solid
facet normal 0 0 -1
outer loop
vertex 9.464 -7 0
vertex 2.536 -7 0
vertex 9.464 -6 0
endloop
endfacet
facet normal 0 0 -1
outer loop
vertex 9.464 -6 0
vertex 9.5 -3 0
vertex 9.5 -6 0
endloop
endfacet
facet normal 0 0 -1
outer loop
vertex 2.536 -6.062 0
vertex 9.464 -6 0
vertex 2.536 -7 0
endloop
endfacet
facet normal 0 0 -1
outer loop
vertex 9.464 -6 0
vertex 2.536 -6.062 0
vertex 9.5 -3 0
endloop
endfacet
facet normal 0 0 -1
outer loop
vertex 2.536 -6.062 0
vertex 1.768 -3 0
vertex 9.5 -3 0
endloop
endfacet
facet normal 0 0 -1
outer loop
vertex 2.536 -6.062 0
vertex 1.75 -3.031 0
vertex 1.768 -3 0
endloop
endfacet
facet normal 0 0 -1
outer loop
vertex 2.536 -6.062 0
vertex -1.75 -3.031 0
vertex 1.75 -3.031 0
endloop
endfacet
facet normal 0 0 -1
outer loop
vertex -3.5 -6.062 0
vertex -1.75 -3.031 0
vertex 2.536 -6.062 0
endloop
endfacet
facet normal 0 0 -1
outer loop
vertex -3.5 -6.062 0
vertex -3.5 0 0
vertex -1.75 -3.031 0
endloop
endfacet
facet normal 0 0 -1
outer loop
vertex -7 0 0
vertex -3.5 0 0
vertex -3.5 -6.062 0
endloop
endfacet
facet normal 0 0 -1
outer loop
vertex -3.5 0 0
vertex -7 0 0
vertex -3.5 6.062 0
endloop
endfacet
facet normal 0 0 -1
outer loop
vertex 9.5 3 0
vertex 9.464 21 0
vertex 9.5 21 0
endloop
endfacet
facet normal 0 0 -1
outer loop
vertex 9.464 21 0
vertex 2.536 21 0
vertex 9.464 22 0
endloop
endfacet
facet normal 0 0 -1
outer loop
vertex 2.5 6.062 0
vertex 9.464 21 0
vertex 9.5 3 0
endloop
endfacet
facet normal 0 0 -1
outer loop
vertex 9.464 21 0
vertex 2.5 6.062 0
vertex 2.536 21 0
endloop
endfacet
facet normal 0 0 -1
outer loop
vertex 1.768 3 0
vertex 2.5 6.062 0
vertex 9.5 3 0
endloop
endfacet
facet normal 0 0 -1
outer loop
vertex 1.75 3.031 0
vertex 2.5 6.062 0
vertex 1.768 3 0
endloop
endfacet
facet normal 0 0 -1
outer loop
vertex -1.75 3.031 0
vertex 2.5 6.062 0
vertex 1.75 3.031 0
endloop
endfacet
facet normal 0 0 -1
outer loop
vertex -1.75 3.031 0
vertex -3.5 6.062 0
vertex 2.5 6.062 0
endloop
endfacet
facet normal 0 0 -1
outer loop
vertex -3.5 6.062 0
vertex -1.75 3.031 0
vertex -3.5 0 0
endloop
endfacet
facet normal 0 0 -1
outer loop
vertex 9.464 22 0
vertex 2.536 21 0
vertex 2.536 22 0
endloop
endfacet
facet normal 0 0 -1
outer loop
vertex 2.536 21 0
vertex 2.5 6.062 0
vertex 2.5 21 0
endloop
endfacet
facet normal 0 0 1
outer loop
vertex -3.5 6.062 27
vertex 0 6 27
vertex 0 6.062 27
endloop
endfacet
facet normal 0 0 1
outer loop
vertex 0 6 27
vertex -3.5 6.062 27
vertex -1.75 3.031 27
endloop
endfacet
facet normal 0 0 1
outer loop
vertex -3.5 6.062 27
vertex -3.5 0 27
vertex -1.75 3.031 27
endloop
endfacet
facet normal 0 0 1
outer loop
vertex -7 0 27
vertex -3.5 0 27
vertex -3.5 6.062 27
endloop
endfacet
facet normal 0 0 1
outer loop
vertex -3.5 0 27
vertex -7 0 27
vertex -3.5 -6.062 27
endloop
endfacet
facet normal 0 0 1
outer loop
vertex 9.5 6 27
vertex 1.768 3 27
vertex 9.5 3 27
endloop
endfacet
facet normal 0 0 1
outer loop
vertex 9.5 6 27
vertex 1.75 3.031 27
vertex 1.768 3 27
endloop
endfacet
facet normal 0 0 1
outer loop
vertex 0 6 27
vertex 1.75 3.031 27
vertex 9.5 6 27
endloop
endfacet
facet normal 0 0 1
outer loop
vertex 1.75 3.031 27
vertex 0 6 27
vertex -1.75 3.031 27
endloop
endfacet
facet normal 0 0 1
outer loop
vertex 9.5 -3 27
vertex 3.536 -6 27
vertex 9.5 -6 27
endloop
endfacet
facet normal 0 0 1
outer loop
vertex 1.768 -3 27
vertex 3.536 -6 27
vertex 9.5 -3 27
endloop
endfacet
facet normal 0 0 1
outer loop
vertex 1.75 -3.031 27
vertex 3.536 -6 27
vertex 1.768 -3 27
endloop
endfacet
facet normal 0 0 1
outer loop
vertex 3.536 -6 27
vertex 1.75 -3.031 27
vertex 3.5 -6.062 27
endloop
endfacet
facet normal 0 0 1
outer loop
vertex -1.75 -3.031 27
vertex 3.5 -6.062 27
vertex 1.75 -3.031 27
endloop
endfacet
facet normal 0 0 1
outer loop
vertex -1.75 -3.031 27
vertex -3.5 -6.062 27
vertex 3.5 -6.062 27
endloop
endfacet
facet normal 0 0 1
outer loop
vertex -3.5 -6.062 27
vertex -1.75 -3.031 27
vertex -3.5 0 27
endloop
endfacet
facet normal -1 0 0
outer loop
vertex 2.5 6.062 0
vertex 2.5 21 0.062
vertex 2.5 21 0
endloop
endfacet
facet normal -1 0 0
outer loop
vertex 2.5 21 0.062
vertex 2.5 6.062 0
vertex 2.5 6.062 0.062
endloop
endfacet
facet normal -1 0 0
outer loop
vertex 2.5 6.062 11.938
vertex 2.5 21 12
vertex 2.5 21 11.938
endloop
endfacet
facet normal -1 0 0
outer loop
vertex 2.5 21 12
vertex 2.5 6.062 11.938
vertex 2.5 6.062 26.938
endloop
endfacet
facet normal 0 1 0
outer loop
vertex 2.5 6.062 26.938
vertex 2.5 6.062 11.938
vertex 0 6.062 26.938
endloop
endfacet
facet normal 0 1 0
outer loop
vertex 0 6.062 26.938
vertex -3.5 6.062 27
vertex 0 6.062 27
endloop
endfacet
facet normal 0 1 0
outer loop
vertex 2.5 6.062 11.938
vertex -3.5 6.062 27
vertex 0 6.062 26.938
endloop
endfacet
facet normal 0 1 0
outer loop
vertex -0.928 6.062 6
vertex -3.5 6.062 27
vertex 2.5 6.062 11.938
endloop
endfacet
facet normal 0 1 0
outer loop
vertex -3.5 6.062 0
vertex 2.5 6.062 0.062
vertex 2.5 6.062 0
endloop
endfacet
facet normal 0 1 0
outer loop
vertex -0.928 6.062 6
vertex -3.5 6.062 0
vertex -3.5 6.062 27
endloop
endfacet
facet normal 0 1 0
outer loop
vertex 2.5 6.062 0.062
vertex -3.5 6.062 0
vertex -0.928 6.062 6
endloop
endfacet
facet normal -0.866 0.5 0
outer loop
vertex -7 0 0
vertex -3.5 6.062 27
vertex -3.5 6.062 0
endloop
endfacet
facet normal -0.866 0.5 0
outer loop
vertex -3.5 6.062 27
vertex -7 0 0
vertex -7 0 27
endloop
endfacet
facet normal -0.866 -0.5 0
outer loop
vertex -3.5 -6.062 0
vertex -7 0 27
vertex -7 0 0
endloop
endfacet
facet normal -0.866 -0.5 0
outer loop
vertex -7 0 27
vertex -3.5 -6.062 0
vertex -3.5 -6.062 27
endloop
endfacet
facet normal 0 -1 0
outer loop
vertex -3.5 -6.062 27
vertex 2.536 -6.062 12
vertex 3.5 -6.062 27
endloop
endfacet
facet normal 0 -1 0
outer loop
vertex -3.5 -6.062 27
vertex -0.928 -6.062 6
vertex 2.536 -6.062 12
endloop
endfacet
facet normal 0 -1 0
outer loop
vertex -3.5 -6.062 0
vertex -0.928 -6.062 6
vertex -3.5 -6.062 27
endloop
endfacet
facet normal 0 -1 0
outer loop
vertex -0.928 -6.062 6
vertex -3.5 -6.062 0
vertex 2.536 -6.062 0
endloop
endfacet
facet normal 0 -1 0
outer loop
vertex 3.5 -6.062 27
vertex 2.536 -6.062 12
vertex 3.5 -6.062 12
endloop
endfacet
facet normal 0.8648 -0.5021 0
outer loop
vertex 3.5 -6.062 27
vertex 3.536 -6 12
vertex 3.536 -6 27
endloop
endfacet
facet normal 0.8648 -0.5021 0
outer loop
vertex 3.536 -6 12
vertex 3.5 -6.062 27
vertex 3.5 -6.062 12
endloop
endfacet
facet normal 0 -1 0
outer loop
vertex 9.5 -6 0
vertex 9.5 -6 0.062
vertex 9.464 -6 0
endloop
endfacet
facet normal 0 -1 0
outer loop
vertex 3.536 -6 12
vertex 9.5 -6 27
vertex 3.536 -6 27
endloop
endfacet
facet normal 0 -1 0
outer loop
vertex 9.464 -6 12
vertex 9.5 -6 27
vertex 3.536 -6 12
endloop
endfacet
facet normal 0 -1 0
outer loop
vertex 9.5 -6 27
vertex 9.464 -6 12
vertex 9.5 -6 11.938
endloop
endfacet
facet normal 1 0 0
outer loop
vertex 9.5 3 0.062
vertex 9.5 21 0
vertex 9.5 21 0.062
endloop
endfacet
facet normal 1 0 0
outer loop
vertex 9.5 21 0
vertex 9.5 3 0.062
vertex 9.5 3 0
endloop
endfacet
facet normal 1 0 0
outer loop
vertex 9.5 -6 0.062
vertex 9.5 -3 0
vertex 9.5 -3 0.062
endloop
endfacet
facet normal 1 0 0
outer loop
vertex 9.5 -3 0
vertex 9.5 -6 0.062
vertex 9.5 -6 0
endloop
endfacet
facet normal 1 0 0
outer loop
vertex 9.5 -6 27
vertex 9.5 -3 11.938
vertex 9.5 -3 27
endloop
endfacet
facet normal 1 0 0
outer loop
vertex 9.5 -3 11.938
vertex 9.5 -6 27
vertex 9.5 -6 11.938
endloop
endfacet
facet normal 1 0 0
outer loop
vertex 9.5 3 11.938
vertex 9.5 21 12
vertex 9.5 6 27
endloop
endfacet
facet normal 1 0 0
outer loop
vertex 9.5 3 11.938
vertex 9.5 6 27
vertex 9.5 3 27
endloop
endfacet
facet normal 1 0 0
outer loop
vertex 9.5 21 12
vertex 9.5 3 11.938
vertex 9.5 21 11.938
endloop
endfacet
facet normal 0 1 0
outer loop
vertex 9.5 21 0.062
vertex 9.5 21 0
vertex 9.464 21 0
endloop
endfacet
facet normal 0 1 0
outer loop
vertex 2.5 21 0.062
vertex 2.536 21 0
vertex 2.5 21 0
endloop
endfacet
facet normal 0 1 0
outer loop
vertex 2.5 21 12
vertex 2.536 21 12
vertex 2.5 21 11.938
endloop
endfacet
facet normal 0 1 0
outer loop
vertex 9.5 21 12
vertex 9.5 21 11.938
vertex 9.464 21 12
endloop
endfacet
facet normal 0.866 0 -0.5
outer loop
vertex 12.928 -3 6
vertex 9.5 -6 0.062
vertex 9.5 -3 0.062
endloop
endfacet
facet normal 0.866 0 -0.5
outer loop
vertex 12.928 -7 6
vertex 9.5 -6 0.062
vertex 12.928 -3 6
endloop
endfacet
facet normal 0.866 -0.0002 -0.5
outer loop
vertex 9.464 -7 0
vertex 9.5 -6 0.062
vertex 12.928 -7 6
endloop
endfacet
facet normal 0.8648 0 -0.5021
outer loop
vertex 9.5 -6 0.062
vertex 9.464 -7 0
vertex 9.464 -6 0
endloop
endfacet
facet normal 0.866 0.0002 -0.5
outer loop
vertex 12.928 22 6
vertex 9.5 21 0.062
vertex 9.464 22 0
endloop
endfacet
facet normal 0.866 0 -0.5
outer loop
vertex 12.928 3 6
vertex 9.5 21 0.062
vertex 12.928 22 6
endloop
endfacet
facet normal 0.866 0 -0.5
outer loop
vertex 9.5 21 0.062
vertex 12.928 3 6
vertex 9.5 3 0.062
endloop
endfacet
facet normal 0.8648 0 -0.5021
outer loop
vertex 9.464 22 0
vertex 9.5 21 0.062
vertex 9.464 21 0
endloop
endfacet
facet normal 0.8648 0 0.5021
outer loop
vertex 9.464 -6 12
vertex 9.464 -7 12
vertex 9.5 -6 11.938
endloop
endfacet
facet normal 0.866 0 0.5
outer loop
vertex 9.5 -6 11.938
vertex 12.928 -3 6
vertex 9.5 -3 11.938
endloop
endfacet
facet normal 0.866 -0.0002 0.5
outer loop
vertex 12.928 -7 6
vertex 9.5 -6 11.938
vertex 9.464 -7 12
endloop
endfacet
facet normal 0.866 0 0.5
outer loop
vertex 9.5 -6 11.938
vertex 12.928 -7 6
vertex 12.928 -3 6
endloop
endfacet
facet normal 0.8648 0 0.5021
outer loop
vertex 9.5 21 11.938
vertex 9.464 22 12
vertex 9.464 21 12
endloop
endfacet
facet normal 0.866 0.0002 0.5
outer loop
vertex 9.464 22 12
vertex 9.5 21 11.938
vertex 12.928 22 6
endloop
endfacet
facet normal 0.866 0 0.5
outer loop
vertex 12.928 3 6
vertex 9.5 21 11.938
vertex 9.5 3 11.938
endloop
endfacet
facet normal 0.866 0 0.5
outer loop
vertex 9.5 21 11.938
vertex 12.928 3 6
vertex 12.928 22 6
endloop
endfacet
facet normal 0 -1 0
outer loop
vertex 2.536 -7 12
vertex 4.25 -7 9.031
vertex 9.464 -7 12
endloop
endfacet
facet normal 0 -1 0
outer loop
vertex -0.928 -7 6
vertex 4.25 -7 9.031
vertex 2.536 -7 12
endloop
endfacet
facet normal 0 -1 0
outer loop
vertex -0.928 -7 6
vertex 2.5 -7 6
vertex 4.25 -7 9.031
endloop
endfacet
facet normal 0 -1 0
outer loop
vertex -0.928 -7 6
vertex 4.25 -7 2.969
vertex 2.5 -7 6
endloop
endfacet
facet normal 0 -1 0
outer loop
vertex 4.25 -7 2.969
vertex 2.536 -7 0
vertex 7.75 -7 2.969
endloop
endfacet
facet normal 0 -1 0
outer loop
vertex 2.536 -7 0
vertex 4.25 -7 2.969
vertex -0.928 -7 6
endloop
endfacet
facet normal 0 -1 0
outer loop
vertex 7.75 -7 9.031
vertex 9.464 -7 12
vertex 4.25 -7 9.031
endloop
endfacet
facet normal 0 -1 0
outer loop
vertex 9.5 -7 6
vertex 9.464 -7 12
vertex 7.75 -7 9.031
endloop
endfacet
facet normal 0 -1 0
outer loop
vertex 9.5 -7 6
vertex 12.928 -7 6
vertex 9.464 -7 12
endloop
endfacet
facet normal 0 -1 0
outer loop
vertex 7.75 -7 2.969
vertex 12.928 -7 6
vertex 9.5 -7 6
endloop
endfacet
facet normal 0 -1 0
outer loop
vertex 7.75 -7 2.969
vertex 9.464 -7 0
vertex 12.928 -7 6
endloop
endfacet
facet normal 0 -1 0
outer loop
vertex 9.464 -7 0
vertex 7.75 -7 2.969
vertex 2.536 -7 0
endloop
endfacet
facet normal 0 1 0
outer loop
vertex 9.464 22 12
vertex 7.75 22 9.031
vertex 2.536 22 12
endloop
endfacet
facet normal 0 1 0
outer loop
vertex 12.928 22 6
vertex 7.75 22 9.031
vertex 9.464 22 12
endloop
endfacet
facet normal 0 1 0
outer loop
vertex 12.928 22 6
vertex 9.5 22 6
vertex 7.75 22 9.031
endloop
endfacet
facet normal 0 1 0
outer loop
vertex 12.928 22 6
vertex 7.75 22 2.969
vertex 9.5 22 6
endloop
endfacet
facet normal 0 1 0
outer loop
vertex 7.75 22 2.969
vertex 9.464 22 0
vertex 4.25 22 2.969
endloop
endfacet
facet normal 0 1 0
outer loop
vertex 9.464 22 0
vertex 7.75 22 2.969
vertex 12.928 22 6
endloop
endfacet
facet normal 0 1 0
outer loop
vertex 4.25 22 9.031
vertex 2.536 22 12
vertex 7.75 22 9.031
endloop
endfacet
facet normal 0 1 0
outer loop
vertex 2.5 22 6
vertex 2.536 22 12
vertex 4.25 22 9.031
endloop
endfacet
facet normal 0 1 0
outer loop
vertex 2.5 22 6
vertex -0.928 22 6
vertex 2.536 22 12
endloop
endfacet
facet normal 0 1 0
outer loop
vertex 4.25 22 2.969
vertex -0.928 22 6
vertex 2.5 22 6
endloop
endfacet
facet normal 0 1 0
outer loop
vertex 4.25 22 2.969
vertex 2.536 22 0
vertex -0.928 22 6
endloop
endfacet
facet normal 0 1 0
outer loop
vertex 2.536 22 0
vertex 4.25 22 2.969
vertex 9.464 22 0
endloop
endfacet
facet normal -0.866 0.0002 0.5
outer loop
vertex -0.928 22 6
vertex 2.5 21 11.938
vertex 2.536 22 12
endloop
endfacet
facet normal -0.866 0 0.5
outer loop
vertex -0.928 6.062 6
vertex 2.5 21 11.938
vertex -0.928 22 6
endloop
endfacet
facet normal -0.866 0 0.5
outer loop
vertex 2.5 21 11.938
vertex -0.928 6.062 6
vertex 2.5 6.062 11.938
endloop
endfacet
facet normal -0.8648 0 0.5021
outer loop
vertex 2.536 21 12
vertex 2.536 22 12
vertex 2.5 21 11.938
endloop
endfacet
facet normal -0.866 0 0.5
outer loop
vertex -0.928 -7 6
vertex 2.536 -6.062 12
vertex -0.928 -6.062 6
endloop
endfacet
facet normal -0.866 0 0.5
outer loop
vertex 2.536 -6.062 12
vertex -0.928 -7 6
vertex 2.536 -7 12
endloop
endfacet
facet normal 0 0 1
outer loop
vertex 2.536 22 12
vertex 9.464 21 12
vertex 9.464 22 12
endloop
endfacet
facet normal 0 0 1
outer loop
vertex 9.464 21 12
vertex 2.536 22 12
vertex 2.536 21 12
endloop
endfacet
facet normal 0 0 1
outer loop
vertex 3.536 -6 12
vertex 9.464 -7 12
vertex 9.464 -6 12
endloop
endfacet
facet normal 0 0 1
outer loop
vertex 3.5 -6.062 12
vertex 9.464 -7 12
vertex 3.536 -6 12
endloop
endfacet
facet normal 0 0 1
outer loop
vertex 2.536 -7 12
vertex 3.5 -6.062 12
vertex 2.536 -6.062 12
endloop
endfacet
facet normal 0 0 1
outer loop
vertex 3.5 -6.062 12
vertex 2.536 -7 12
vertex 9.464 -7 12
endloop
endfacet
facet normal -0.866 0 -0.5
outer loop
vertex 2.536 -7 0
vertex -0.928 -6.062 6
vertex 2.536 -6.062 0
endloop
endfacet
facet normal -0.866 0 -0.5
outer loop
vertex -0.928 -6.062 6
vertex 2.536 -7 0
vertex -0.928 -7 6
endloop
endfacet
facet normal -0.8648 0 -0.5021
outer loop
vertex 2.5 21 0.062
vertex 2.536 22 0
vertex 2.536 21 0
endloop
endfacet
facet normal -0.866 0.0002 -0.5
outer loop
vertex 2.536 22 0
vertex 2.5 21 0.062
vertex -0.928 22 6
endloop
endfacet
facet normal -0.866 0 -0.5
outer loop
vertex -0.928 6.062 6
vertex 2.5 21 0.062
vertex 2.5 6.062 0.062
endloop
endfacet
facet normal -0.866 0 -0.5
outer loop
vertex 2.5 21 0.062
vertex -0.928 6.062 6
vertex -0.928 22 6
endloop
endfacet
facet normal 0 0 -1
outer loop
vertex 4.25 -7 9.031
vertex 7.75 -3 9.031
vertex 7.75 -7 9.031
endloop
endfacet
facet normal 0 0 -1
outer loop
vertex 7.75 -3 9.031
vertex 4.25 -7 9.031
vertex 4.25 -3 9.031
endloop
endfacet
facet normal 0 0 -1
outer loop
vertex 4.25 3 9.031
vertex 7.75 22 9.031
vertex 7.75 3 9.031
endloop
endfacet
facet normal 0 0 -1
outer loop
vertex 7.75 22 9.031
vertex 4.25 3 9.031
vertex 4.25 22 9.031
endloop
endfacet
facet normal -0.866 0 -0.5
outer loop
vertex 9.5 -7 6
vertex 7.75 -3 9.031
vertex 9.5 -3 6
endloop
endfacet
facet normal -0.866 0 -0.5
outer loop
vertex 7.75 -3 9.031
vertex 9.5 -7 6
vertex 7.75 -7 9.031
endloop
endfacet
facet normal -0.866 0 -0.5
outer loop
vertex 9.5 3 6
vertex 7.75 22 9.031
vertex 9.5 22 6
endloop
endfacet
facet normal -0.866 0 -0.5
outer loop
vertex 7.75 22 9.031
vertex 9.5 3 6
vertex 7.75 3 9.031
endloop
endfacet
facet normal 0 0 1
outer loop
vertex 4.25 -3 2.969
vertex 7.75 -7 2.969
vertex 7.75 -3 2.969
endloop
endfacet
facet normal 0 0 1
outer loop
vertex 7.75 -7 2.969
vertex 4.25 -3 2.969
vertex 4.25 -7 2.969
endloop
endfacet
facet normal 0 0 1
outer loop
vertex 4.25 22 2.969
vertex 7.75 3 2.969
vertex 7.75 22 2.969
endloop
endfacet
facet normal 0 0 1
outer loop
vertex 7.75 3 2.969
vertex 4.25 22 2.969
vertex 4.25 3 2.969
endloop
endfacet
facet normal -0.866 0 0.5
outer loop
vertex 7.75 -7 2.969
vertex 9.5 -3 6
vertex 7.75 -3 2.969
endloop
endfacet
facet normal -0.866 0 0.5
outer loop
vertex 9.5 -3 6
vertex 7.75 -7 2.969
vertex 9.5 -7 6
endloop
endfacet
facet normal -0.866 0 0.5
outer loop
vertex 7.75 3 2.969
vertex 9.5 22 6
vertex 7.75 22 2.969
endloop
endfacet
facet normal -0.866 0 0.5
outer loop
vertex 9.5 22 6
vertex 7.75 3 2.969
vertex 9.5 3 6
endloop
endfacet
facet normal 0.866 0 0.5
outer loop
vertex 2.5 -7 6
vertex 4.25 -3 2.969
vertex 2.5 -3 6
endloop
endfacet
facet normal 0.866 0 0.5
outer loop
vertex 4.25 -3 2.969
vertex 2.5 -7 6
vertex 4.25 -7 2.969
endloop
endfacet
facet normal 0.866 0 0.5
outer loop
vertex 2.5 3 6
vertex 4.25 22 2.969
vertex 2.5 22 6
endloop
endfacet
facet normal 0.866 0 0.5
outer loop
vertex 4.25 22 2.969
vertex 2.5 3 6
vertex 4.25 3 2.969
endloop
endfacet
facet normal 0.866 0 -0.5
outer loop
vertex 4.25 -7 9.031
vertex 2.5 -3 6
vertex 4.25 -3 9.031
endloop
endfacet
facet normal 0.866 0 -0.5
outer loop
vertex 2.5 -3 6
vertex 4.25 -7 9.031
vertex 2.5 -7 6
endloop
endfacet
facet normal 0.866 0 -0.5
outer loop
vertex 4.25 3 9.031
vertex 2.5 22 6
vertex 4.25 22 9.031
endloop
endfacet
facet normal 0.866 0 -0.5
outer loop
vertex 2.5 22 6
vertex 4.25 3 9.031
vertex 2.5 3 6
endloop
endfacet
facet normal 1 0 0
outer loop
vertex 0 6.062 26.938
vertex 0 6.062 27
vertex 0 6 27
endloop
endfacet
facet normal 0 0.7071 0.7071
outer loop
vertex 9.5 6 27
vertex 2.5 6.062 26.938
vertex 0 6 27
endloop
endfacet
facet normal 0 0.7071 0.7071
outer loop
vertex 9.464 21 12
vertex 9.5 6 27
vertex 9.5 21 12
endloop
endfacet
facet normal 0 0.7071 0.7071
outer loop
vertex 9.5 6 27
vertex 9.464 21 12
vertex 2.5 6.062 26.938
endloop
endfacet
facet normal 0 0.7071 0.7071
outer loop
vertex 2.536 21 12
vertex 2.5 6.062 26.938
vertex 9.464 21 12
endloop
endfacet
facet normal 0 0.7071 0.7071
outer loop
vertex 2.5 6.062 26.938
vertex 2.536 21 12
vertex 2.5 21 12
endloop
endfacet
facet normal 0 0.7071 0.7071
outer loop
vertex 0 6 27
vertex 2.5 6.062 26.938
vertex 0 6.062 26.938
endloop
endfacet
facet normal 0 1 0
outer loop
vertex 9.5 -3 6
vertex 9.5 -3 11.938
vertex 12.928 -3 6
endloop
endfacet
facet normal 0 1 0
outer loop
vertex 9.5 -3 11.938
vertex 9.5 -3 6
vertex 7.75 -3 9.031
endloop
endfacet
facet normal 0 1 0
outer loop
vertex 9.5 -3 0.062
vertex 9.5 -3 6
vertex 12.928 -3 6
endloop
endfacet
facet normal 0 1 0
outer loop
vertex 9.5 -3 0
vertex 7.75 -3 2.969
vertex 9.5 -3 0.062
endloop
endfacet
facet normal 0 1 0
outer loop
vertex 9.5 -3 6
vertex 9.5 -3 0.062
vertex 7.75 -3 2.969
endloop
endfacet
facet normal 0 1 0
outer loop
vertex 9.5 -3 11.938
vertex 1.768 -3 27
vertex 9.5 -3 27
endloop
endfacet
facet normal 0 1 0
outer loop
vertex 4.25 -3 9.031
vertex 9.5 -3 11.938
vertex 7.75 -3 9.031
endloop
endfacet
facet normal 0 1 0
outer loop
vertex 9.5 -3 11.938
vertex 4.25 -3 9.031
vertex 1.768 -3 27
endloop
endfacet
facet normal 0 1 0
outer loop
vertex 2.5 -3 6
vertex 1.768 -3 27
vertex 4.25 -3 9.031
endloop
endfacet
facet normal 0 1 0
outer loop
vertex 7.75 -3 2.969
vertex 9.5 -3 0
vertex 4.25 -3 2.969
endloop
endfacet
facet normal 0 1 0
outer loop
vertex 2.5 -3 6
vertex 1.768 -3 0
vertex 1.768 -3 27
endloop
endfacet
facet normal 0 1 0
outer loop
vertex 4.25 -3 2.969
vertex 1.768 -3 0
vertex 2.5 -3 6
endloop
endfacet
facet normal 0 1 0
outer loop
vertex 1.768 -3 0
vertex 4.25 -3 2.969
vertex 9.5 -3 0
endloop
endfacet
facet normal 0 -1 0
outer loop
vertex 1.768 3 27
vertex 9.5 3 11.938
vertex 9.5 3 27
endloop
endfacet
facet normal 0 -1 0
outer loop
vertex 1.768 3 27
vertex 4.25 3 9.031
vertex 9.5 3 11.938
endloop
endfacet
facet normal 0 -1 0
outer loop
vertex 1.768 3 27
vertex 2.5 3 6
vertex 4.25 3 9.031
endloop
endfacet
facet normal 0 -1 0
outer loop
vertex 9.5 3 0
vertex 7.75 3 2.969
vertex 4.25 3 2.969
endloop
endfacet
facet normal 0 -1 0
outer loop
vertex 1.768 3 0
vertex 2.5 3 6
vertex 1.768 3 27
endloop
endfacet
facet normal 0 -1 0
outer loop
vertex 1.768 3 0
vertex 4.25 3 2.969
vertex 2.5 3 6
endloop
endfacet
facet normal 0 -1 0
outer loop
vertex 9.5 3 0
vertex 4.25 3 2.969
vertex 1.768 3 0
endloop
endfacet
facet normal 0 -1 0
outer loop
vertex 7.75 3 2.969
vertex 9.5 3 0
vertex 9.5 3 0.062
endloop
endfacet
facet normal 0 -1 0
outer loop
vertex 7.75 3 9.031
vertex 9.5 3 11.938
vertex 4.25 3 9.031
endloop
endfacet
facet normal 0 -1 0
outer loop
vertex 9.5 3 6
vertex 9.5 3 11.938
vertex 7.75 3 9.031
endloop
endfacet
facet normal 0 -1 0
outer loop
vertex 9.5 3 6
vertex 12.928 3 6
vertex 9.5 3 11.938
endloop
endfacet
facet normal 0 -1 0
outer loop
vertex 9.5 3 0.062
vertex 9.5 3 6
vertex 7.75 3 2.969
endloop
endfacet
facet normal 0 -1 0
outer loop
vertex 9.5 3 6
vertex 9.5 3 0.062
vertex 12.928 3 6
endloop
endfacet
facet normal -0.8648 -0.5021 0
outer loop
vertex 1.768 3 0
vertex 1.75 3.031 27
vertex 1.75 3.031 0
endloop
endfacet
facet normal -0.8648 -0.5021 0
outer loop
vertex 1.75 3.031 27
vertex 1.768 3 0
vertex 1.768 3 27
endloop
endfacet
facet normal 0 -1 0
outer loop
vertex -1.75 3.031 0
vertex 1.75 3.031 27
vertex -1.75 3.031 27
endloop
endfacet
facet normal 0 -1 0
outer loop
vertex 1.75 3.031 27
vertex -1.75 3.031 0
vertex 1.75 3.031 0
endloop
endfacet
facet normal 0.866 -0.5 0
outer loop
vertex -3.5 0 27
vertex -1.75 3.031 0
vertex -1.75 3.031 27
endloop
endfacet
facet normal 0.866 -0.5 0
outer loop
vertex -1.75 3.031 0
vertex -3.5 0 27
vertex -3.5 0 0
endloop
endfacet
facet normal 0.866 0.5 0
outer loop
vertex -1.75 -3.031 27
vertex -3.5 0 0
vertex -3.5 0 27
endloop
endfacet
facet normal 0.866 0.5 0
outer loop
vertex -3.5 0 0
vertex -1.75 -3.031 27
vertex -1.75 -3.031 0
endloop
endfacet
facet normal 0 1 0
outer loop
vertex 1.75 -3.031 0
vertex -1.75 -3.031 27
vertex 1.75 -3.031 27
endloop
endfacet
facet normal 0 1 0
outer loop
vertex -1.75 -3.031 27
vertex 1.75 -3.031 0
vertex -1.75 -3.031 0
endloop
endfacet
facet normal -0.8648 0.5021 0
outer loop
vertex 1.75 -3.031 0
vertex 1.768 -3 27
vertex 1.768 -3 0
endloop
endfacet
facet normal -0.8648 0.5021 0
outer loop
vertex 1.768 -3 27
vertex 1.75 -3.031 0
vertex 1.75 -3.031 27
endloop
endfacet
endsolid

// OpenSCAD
// file: configuration.scad
// default configuration
// m6 rods and nema14 motors

rod_size = 6;
rod_nut_size = 12; //12 for M6, 16 for M8
bearing_size = 12.5; //12 for LM6UU, 15 for LM8UU,LM8SUU
bearing_length = 20; //19 for LM6UU, 17 for LM8SUU, 24 for LM8UU
yz_motor_distance = 25;
motor_screw_spacing = 26; //26 for NEMA14, 31 for NEMA17
motor_casing = 38; //38 for NEMA14, 45 for NEMA17
end_height = 40;
bed_mount_height = 16;
//x_rod_spacing = motor_screw_spacing + 3 + rod_size;
x_rod_spacing = 30;
x_carriage_width = 70;
carriage_extruder_offset = 5;
pulley_size = 20;
idler_pulley_width = 10;
gusset_size = 15;
// main file
// z_top_clamp

include <configuration.scad>

module z_top_clamp() difference() {
	union() {
		linear_extrude(height = rod_size * 2 + gusset_size, convexity = 5) difference() {
			union() {
				circle(r = rod_size * 7/6, $fn = 6);
				translate([0, -rod_size, 0]) square([rod_size * (1 + 7/12), rod_size * 2]);
				translate([rod_size - rod_size * 7/12, rod_size / 2, rod_size]) square([rod_size * 7/6, rod_size / 2 + gusset_size]);
			}
		}
		translate([rod_size, -rod_size - 1, rod_size]) rotate([-90, 0, 0]) cylinder(r = rod_size / cos(180 / 6), h = rod_size * 2 + gusset_size + 2, $fn = 6);
	}
	translate([rod_size, -rod_size - 2, rod_size]) rotate([-90, 0, 0]) cylinder(r = rod_size * 7/12, h = gusset_size + rod_size * 2 + 4, $fn = 6);
	translate([rod_size, rod_size + gusset_size, rod_size * 2 + gusset_size]) rotate([45, 0, 0]) cube([rod_size * 2, gusset_size * sqrt(2), gusset_size * sqrt(2)], center = true);
	translate([0, 0, -1]) linear_extrude(height = rod_size * 2 + gusset_size + 2, convexity = 5) {
		circle(r = rod_size * 7/12, $fn = 6);
		%translate([rod_size, -10, rod_size * 7/6]) rotate([-90, 0, 0]) cylinder(r = rod_size * 7/12, h = 160, $fn = 6);
		translate([0, -rod_size / 2, 0]) square([gusset_size + rod_size * 2 + 1, rod_size]);
	}
}


z_top_clamp();
